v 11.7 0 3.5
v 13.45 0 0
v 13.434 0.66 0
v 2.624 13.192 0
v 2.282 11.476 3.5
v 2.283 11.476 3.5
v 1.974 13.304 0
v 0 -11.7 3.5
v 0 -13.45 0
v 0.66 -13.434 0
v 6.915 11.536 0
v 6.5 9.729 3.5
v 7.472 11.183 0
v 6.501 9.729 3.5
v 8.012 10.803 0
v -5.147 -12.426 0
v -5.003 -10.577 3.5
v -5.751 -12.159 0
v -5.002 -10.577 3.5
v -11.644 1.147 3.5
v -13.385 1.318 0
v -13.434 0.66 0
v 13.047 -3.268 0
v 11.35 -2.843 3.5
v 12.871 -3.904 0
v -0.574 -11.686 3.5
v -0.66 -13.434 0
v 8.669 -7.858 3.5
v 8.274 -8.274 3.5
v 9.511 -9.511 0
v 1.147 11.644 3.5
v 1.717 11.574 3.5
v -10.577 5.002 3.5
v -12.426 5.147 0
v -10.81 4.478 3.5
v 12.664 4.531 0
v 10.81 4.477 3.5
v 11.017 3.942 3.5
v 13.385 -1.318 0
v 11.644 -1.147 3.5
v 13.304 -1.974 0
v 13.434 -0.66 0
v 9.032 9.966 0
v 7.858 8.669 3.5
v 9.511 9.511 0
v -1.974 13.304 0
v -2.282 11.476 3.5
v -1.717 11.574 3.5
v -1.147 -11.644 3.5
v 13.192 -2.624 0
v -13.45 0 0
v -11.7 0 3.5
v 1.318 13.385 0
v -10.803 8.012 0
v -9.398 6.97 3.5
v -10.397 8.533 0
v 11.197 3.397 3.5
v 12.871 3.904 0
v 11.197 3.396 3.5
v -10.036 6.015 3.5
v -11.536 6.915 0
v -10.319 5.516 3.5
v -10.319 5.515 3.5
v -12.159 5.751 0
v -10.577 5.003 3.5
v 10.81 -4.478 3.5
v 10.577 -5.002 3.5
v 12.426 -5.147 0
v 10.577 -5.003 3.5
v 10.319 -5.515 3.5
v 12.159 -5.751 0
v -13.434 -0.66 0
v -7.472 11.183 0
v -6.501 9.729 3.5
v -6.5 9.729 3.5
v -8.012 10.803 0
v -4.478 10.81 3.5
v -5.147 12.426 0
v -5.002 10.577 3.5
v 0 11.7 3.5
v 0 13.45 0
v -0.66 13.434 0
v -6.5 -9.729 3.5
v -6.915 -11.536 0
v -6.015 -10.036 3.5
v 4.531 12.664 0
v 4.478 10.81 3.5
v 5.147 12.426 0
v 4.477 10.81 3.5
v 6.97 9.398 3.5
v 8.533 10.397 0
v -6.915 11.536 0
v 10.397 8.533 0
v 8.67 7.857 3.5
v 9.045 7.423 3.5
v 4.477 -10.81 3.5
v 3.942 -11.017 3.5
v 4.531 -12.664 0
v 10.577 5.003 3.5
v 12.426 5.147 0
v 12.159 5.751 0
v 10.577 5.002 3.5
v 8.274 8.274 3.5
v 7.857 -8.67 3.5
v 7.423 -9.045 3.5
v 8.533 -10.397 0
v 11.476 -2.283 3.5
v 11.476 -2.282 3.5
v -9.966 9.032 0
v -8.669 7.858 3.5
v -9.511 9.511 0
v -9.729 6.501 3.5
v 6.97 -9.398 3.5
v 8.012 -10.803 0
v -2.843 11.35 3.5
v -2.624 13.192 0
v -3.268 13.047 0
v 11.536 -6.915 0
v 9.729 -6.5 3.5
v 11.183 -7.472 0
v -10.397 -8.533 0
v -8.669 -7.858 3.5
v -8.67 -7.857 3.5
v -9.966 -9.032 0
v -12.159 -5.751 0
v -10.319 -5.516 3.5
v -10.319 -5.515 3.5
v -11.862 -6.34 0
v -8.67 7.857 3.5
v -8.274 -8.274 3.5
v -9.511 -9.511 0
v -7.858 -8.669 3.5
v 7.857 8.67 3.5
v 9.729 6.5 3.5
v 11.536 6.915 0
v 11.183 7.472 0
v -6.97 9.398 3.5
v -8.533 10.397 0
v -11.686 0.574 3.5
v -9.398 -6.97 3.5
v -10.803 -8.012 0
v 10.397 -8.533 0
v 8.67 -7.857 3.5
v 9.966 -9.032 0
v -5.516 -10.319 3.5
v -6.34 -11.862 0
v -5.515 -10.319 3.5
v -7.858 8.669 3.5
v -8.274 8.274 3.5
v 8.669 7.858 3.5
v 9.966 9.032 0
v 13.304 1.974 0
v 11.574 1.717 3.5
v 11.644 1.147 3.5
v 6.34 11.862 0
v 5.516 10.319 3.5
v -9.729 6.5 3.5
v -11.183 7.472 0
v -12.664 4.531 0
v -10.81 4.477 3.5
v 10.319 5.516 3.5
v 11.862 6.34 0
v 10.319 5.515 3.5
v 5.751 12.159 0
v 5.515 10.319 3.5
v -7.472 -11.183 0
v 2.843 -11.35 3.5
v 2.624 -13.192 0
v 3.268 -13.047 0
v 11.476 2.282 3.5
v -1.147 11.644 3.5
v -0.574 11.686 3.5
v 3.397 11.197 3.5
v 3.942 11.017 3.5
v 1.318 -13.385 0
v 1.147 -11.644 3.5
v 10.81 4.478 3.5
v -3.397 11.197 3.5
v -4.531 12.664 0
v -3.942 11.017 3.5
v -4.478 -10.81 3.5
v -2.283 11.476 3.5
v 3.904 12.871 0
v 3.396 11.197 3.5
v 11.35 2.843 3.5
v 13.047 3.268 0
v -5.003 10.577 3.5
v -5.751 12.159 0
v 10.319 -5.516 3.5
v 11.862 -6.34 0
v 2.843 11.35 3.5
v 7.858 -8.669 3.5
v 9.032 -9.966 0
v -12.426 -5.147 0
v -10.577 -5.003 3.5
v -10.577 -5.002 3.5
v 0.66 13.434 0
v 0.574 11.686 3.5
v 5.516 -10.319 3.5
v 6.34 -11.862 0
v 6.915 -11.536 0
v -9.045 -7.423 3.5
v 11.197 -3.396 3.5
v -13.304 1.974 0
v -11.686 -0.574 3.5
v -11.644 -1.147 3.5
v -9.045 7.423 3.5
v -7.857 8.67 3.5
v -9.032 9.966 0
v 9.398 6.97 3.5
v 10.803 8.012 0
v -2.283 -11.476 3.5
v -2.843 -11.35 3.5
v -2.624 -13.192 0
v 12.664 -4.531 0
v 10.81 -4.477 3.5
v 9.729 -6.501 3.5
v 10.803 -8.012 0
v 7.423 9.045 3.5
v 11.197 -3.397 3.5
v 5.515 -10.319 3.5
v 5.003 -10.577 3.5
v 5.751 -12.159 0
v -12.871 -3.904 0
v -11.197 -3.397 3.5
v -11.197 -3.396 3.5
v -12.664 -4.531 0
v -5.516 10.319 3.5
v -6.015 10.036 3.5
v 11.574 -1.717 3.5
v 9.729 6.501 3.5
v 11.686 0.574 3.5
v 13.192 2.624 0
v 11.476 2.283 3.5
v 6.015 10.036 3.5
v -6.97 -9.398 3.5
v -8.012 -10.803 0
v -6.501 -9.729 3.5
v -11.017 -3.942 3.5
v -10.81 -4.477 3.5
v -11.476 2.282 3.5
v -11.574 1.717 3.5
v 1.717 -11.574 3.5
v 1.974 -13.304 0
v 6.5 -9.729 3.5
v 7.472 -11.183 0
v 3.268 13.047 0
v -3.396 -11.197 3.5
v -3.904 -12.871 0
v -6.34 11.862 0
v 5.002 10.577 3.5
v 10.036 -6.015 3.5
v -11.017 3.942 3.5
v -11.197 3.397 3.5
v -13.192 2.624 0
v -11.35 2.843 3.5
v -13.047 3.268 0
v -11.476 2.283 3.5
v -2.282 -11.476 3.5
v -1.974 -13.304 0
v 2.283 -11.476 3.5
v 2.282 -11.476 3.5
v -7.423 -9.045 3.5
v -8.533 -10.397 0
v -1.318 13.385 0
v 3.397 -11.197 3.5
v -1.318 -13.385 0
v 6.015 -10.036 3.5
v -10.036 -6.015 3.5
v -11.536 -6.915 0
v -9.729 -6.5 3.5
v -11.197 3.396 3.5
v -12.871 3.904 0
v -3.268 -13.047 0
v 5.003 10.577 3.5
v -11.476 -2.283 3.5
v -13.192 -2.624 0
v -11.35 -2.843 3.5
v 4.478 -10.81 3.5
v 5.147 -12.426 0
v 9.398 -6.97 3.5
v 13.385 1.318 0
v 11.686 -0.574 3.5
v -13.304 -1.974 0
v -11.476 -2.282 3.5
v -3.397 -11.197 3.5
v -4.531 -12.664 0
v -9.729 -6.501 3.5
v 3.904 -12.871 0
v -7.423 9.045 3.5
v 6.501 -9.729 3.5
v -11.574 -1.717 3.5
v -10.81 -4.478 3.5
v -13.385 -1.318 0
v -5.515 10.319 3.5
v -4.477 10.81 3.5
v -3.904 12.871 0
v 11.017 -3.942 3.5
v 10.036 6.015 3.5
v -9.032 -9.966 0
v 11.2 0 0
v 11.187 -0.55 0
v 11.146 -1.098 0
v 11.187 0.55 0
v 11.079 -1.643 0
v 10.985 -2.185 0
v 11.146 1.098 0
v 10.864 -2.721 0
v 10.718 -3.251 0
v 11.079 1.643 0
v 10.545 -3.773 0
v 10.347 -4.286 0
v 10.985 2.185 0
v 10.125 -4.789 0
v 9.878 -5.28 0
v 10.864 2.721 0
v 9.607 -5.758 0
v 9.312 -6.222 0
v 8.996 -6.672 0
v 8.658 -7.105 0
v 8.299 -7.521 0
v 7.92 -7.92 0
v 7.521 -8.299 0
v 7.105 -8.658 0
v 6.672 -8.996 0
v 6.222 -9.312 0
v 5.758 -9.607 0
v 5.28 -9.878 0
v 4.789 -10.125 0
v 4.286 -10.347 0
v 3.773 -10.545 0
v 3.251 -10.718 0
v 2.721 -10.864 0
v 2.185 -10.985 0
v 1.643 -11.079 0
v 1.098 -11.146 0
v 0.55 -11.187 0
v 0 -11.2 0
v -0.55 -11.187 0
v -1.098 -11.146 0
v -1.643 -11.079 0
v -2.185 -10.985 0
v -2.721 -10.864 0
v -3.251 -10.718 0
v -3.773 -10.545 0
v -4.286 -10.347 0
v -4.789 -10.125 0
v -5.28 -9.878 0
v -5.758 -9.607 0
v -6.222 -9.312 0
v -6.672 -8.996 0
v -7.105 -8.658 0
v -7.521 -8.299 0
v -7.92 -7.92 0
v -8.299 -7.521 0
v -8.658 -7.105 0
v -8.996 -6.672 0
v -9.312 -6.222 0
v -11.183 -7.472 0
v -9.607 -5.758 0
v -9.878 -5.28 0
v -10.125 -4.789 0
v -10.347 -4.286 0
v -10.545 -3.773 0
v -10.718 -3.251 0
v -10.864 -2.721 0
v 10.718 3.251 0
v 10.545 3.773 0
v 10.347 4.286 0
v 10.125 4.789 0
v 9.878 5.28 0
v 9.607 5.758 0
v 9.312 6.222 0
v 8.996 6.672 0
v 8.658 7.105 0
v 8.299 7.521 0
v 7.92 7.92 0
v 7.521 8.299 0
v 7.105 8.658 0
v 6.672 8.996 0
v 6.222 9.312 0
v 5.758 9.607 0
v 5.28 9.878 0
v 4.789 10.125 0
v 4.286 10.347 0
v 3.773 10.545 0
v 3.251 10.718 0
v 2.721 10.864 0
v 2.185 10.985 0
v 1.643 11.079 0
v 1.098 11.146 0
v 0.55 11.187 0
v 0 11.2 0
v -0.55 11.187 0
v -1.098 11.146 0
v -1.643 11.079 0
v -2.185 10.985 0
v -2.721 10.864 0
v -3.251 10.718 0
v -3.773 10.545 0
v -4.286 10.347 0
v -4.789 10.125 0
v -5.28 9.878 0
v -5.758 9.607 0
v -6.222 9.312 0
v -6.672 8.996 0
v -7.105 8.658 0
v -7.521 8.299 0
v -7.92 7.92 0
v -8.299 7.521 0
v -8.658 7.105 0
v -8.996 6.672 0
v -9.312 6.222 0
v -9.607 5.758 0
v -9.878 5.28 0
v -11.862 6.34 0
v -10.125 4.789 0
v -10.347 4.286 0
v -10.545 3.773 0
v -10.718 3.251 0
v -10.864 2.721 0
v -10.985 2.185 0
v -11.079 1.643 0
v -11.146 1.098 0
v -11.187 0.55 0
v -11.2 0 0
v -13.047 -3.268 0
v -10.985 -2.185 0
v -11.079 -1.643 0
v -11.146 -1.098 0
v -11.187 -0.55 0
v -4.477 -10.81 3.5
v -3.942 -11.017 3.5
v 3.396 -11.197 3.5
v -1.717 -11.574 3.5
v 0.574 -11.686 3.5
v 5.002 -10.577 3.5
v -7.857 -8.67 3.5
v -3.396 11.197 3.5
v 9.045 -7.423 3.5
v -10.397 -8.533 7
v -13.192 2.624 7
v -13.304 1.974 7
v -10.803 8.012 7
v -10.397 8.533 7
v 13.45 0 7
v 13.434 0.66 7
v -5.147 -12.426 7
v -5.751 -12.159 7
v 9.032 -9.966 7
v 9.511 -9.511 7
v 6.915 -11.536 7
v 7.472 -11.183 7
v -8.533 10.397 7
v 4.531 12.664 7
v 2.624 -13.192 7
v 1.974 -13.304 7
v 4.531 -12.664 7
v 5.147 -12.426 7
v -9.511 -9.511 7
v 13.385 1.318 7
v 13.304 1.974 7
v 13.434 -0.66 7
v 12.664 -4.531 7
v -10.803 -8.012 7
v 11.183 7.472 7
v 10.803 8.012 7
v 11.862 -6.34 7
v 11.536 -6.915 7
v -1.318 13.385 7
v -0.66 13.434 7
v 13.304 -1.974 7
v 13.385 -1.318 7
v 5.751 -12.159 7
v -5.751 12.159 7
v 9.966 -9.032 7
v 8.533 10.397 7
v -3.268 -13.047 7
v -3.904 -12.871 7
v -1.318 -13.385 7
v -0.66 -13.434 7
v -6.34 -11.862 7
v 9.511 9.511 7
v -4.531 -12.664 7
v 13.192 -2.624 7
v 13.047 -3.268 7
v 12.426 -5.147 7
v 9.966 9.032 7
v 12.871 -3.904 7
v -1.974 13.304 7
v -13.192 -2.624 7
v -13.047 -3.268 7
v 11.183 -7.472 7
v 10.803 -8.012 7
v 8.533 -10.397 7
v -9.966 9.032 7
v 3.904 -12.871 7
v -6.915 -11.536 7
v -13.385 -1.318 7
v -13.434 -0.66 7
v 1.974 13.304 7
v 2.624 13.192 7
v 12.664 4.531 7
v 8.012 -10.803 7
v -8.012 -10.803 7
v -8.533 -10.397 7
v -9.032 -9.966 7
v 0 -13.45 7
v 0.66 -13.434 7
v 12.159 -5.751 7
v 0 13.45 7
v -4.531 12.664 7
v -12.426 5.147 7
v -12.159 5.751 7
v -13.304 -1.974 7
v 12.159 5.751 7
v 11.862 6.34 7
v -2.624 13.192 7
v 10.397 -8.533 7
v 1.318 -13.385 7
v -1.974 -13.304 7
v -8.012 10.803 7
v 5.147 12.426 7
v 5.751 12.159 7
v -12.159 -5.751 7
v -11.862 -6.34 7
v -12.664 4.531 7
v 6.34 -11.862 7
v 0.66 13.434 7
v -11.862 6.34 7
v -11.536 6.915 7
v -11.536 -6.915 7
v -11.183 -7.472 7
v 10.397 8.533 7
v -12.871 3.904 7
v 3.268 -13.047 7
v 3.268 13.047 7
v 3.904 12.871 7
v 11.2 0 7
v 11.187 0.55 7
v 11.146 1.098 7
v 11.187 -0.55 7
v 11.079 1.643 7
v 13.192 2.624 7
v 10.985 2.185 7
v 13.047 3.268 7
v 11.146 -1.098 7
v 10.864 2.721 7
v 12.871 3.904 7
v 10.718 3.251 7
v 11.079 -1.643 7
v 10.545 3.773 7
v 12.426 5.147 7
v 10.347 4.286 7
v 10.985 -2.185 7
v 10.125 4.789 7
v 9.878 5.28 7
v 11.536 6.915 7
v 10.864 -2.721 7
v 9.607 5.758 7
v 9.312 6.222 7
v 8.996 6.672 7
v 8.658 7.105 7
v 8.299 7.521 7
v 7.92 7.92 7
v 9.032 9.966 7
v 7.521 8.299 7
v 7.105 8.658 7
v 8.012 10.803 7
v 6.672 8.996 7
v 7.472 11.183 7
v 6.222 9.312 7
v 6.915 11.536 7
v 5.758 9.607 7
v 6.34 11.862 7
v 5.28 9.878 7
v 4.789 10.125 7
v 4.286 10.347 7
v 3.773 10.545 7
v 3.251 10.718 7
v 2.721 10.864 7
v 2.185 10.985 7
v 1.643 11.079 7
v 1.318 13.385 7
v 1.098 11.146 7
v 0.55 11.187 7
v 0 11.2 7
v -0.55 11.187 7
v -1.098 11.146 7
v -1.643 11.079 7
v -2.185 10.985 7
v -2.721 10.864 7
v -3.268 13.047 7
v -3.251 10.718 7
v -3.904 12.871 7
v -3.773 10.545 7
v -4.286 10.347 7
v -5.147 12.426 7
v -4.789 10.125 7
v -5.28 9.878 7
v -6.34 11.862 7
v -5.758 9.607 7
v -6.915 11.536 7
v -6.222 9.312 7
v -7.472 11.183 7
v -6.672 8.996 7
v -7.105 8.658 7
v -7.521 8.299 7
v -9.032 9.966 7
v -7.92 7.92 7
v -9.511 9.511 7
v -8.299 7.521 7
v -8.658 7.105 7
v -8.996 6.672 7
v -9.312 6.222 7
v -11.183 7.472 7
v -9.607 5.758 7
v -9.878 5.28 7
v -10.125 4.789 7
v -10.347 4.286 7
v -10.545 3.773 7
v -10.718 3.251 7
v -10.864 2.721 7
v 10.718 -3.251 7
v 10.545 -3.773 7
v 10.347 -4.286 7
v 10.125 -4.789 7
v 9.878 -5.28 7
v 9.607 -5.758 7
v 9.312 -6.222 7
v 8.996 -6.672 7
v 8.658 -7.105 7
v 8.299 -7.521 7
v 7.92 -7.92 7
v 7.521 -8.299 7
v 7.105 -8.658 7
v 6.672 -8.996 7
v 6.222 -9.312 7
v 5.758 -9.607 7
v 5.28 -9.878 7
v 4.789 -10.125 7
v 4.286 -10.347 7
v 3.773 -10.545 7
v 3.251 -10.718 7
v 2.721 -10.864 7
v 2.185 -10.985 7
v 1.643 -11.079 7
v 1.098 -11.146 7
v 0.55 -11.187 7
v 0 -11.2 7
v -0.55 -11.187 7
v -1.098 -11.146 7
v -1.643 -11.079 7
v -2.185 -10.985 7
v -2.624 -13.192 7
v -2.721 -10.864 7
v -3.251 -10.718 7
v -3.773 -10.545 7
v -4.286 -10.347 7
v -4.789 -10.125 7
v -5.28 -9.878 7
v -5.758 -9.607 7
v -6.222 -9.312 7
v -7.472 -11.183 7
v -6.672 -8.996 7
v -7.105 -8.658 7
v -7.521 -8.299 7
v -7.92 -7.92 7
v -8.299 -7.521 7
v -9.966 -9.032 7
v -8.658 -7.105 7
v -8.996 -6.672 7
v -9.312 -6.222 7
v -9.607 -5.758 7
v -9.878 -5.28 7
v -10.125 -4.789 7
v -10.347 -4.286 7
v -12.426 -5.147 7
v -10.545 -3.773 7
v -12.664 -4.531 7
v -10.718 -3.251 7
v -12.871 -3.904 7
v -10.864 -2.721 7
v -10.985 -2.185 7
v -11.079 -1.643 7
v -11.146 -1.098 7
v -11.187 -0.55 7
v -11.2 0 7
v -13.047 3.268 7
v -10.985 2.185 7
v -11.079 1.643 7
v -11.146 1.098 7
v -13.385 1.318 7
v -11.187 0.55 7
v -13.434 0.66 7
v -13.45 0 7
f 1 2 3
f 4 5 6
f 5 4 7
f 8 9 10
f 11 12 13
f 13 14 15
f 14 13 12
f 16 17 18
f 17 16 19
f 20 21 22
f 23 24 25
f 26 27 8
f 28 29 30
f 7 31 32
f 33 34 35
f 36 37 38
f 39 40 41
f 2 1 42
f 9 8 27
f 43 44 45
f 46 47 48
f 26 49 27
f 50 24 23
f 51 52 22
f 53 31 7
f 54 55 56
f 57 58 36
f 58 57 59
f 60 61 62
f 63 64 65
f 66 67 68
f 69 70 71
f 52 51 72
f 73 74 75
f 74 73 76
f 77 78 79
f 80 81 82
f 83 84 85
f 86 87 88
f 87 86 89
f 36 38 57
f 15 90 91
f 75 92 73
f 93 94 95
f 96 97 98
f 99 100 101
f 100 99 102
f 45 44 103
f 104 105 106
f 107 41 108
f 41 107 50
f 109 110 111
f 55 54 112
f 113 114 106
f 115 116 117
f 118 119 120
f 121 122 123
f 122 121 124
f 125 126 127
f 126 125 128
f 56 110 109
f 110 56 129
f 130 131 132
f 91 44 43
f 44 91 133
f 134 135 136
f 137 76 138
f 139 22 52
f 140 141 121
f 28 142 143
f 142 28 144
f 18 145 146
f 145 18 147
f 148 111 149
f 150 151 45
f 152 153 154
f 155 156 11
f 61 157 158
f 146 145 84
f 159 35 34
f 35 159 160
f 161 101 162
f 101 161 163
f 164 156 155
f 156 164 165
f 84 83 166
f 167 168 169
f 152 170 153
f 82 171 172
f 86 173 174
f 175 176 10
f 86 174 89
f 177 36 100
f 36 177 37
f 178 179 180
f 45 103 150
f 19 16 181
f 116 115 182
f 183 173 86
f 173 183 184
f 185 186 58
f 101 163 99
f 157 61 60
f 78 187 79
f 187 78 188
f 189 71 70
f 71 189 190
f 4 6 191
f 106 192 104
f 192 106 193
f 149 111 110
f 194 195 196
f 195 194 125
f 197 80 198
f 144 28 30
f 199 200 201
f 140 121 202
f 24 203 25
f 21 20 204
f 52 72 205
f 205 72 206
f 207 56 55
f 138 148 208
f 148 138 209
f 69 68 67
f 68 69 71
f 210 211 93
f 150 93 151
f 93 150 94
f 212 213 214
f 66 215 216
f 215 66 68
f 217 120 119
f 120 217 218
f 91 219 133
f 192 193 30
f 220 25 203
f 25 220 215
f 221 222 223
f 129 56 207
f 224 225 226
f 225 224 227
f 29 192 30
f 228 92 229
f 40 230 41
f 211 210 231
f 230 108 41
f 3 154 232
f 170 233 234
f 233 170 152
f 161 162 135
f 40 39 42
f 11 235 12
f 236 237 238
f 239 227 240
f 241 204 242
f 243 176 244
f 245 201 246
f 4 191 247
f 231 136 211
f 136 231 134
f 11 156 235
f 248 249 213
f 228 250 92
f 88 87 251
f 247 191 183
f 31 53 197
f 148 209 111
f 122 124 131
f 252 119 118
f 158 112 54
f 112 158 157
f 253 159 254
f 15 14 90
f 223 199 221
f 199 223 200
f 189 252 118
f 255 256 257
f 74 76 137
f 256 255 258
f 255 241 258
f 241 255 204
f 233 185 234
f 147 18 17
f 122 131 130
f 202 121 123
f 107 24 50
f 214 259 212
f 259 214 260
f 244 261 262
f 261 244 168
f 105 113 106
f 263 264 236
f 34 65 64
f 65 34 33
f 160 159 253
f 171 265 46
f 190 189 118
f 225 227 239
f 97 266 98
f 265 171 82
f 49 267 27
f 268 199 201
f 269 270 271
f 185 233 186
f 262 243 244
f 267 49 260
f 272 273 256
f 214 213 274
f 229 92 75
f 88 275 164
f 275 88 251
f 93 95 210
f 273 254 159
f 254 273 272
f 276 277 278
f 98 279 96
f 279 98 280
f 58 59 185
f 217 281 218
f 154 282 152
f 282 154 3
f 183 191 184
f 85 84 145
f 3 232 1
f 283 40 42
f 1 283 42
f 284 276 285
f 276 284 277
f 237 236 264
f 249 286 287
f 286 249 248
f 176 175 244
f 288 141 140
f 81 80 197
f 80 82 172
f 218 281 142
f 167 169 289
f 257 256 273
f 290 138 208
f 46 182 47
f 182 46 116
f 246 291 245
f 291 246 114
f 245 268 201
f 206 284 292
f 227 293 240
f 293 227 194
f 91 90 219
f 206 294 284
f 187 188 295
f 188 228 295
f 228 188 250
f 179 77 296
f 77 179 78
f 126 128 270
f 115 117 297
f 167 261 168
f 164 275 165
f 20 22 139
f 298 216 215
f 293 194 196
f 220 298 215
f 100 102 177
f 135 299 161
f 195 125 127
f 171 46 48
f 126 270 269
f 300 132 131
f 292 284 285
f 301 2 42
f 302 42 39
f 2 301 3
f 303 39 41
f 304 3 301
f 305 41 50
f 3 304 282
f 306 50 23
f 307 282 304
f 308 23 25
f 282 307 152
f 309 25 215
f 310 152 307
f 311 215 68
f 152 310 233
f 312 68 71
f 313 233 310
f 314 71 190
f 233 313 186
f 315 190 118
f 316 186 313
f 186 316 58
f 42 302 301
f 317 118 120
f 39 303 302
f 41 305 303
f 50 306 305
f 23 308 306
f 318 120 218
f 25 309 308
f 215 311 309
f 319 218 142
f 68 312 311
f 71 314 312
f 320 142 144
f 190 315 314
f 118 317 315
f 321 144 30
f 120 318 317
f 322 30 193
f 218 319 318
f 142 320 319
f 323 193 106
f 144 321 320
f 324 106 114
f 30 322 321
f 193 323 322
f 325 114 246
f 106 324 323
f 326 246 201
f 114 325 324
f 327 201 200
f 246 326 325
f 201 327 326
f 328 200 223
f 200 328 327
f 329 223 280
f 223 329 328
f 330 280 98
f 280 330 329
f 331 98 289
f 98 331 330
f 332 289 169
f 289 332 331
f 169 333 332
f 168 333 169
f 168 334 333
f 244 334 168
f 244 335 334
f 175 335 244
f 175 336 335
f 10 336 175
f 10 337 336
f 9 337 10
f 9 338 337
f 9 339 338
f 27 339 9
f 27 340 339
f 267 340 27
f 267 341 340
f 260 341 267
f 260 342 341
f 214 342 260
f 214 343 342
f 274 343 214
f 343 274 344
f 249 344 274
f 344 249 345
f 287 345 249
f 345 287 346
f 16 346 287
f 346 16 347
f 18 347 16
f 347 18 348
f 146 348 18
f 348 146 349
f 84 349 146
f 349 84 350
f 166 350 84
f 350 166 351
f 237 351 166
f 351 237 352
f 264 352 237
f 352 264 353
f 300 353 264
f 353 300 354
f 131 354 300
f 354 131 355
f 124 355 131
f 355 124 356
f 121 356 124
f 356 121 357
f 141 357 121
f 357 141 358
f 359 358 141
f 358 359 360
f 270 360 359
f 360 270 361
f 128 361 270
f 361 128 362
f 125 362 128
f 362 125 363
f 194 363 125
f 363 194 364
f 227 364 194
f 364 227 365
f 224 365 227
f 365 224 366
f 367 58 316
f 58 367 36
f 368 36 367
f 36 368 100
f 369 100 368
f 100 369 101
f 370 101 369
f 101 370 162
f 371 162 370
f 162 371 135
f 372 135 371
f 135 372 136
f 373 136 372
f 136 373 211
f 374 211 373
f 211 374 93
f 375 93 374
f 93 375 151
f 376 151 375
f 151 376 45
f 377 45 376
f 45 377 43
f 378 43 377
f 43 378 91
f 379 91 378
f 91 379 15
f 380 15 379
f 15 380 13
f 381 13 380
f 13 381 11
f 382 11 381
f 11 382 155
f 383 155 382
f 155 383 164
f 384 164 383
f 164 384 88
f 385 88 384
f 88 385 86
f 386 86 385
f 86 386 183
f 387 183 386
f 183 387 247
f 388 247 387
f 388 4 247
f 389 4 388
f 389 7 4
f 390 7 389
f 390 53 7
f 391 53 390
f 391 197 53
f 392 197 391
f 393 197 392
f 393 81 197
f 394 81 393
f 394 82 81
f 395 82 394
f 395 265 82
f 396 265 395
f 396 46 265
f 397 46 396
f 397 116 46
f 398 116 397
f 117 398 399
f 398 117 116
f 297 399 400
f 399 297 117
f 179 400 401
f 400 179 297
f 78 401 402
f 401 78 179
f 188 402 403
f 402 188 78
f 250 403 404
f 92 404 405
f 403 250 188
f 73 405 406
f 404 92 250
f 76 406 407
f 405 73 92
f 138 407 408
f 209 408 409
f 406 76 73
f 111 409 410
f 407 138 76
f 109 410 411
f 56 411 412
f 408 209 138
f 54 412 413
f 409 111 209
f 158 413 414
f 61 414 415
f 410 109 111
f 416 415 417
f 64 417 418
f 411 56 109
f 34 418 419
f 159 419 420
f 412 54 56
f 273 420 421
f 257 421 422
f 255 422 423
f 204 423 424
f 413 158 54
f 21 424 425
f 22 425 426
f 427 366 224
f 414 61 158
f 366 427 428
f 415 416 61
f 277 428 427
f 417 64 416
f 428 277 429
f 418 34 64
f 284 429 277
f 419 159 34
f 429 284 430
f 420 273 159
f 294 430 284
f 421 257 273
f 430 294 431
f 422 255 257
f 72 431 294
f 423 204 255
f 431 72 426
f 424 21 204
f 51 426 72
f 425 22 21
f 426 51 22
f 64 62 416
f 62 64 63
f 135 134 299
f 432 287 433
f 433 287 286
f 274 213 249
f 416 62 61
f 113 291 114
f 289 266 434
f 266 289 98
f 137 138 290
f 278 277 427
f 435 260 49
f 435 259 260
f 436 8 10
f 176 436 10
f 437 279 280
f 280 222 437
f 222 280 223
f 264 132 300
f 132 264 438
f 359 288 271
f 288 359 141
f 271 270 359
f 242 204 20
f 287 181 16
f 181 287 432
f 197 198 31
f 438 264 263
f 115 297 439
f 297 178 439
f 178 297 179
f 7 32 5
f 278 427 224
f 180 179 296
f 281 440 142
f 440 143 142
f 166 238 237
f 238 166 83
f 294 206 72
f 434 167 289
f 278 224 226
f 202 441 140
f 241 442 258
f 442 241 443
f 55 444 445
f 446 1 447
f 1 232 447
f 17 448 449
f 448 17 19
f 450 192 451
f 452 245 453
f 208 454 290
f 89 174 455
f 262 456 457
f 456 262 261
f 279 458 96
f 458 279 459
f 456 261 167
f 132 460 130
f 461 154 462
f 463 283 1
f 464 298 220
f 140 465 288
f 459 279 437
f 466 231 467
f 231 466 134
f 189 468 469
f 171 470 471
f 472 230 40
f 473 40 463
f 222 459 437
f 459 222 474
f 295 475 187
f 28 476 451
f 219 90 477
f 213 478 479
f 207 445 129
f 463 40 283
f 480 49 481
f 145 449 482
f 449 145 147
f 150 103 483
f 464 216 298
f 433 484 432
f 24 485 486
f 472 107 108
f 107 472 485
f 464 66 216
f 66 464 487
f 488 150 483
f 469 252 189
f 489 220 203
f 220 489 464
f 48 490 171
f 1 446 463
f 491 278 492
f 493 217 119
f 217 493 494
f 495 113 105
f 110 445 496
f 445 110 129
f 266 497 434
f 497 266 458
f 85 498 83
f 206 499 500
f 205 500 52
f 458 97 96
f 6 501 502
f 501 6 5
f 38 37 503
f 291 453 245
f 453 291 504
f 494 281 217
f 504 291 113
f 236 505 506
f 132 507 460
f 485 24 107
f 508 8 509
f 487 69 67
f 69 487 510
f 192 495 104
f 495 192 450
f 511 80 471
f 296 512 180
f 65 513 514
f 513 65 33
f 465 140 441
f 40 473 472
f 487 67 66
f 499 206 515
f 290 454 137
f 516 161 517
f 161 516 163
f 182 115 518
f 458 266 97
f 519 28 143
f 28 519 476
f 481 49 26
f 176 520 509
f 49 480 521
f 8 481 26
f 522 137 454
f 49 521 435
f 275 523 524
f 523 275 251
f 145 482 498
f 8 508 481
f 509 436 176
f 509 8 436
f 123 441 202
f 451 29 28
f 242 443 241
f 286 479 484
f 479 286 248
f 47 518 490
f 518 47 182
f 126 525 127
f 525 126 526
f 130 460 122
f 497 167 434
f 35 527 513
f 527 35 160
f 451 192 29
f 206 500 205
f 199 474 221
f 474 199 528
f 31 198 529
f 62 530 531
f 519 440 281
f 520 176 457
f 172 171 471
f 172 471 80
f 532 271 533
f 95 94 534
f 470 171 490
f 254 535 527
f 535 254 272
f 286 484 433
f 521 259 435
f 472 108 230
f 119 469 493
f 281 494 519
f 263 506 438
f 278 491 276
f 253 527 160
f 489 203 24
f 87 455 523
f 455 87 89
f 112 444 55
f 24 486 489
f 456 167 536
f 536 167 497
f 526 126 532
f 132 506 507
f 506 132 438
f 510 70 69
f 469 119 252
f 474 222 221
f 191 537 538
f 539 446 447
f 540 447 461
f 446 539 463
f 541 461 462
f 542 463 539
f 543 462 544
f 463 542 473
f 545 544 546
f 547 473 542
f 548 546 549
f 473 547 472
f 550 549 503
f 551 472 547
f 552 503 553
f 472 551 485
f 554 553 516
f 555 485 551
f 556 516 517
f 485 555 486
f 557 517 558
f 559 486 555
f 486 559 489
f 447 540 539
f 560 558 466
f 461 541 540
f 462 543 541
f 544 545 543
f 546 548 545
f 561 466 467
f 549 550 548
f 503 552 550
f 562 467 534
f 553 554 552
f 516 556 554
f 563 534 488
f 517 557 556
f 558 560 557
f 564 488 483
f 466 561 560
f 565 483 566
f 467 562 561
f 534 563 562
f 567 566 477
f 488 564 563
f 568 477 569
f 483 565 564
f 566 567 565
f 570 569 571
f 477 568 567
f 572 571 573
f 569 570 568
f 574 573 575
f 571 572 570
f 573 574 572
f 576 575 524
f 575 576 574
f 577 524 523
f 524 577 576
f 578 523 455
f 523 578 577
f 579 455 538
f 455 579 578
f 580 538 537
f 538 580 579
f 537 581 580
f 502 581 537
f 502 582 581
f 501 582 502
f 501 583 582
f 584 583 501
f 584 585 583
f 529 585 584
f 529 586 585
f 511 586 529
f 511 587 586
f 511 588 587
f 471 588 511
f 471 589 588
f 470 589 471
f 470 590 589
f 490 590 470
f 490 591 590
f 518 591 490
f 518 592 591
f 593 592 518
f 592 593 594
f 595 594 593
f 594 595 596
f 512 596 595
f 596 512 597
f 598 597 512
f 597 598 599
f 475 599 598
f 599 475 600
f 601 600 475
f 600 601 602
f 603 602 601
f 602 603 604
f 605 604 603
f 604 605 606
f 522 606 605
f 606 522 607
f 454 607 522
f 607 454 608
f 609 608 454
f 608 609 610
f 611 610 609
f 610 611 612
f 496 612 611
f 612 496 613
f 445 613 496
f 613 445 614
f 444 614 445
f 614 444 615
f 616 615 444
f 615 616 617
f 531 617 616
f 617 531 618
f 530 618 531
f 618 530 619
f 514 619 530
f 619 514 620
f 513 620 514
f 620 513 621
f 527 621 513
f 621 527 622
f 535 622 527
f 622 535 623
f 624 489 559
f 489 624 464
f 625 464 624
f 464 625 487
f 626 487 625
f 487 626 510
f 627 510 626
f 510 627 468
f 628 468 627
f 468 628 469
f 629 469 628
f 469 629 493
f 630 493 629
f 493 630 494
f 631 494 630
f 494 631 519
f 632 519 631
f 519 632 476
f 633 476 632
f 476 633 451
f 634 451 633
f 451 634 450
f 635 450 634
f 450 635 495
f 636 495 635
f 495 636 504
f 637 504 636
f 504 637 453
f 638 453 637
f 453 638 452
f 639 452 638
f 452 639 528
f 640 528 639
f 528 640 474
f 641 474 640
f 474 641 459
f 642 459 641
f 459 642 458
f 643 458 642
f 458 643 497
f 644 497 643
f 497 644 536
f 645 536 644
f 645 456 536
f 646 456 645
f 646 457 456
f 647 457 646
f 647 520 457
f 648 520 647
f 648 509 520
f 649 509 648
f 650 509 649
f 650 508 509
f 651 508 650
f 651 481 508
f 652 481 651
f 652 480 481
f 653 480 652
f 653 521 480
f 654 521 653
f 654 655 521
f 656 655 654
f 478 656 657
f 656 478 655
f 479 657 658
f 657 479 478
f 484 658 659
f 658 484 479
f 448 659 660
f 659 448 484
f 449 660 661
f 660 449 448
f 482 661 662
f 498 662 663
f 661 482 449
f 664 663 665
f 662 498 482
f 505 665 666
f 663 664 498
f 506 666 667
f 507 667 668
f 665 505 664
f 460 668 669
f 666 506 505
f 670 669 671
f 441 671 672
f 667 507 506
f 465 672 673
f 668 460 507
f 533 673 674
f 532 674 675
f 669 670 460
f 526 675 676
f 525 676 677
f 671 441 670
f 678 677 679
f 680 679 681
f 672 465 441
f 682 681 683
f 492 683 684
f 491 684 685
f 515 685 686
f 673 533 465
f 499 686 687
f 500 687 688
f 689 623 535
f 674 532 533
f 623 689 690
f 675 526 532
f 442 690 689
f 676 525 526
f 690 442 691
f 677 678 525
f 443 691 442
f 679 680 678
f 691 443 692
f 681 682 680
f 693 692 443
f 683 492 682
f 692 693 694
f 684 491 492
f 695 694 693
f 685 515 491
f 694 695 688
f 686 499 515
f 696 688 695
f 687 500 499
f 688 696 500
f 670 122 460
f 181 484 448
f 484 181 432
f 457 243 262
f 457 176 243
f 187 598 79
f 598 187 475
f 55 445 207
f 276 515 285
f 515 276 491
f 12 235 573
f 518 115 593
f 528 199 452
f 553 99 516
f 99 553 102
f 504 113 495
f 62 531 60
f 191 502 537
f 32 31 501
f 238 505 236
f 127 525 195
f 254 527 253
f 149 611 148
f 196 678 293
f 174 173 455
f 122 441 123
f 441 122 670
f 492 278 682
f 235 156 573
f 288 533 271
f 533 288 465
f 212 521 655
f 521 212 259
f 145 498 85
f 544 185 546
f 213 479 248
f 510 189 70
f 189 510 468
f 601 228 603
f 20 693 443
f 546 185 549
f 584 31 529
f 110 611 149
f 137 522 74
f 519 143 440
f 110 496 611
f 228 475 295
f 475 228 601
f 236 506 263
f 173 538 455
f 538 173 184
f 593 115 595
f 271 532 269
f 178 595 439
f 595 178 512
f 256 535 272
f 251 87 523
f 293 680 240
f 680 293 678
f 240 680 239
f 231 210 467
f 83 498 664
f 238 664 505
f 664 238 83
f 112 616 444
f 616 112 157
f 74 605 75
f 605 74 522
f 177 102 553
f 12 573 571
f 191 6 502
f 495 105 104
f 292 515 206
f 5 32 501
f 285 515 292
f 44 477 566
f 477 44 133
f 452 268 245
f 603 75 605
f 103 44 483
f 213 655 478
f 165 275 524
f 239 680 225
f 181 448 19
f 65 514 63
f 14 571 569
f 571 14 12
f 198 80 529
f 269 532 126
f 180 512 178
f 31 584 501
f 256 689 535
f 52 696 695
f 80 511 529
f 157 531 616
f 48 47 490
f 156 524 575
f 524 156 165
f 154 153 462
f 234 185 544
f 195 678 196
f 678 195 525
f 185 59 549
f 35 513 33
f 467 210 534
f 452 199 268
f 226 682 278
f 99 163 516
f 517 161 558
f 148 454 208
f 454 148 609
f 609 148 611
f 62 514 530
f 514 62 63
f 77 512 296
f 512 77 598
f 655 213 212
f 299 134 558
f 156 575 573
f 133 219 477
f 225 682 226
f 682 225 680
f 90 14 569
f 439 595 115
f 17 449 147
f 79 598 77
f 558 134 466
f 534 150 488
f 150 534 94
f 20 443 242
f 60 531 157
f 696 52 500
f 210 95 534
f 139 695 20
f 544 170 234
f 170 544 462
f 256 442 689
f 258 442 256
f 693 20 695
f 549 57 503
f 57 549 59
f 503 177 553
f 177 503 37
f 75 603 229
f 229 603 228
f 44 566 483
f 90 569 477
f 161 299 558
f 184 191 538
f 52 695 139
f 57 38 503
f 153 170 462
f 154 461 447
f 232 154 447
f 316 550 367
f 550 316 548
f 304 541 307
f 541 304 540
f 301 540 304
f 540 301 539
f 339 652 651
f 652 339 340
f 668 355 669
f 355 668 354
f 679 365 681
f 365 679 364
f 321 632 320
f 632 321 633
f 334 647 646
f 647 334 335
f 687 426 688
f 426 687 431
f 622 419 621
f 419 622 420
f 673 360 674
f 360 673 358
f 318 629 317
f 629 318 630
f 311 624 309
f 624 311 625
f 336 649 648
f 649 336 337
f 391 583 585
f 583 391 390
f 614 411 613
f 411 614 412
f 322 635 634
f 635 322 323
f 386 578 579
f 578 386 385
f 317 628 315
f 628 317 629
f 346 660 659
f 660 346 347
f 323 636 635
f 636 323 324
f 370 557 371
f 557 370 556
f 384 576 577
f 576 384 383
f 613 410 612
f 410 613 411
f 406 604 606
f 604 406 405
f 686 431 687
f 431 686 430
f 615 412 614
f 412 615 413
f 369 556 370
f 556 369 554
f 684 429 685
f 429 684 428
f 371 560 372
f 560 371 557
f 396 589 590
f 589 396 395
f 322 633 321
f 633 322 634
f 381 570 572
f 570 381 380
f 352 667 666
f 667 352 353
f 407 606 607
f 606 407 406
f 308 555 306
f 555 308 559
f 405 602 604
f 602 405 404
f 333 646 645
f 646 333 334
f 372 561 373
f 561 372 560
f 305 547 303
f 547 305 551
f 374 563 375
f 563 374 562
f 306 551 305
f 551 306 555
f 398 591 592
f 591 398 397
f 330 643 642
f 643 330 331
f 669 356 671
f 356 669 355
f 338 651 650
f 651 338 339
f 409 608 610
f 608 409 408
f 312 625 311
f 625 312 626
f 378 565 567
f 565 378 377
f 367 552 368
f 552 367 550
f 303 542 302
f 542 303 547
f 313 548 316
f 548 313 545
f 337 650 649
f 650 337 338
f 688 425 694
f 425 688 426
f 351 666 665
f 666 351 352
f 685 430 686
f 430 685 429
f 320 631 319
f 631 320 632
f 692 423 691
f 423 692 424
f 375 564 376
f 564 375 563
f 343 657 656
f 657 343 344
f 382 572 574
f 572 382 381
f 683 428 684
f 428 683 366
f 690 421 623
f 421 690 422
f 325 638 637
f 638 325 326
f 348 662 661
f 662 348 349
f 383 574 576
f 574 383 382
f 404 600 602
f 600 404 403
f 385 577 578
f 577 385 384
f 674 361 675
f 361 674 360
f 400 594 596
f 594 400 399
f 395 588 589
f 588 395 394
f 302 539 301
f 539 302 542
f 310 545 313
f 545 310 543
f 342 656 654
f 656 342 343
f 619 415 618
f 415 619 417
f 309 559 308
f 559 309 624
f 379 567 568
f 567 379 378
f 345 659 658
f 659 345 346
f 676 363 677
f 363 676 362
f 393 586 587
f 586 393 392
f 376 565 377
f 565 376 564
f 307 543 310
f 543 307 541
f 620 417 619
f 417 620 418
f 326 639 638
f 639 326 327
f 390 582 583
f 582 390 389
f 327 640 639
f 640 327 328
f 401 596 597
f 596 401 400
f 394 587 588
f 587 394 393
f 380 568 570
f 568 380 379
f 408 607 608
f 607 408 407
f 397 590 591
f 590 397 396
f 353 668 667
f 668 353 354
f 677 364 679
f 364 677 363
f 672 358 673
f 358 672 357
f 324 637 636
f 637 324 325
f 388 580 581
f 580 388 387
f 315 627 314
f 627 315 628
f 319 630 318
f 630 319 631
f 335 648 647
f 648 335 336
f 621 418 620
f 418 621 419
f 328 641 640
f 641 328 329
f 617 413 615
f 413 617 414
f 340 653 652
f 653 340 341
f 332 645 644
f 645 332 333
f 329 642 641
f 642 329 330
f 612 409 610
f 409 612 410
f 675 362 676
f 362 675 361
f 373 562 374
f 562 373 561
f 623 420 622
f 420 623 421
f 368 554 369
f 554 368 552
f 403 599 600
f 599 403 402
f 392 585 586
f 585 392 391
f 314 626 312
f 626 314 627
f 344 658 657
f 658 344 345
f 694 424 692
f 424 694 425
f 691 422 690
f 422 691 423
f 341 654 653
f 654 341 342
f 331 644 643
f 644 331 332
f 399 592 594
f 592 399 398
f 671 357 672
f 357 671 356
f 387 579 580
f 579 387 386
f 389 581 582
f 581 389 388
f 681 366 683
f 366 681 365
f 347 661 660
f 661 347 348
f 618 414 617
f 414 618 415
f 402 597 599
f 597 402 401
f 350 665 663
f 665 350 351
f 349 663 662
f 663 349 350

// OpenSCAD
// file: configuration.scad
/*
 * Igor Soares' parallel kinematic XY
 * Configuration
 * (C) 2014 by Ígor Bruno Pereira Soares
 *
 * This project is free: you can redistribute it and/or modify
 * it under the terms of the GNU General Public License as published by
 * the Free Software Foundation, either version 2 of the License, or
 * (at your option) any later version.
 *
 * This project is distributed in the hope that it will be useful,
 * but WITHOUT ANY WARRANTY; without even the implied warranty of
 * MERCHANTABILITY or FITNESS FOR A PARTICULAR PURPOSE.  See the
 * GNU General Public License for more details.
 *
 * You should have received a copy of the GNU General Public License
 * along with this project.  If not, see <http://www.gnu.org/licenses/>.
 */

LIGHT_WALL_WIDTH = 2.01;
WALL_WIDTH = 5.0;
VERTICAL_SUPPORT_WALL = 0.5;
HORIZONTAL_SUPPORT_WALL = 0.255;

BEARING_DIAMETER = 22.4;
BEARING_WIDTH = 7;
BEARING_SCREW_DIAMETER = 8.2;
BEARING_SCREW_NUT_WIDTH = 13;

INNER_BEARING_SCREW_DISTANCE_TO_ROD = VERTICAL_SUPPORT_WALL;
INNER_BEARING_POS = 15;

SPACING_TO_BEARING = 18.0;
ROD_ACTUAL_DIAMETER = 8.0;
ROD_HOLE_DIAMETER = 8.4;

ROD_CLAMP_SCREW_DIAMETER = 3.6;
ROD_CLAMP_SCREW_NUT_WIDTH = 6.7;
ROD_CLAMP_SCREW_NUT_H = 3.5;
ROD_CLAMP_GAP = 1.0;

MOTOR_SCREW_DIAMETER = 3.4;
MOTOR_SCREW_MOUNT = 31; // nema 17
MOTOR_SIZE = 43;
MOTOR_MOUNT_INNER_DIAMETER = 30;
MOTOR_BELT_CLEARANCE = 5;

MOTOR_SUPPORT_SCREW_DIAMETER = 4.8 + 0.3; // 3/16 + tolerance
MOTOR_SUPPORT_SCREWS_DISTANCE = 40;

BEARING_GUIDE_H = 7;
BEARING_GUIDE_ANGLE = 30;

ST = 0.001;
// main file
/*
 * Igor Soares' parallel kinematic XY
 * Bearing Guide
 * (C) 2014 by Ígor Bruno Pereira Soares
 *
 * This project is free: you can redistribute it and/or modify
 * it under the terms of the GNU General Public License as published by
 * the Free Software Foundation, either version 2 of the License, or
 * (at your option) any later version.
 *
 * This project is distributed in the hope that it will be useful,
 * but WITHOUT ANY WARRANTY; without even the implied warranty of
 * MERCHANTABILITY or FITNESS FOR A PARTICULAR PURPOSE.  See the
 * GNU General Public License for more details.
 *
 * You should have received a copy of the GNU General Public License
 * along with this project.  If not, see <http://www.gnu.org/licenses/>.
 */

include <configuration.scad>

bearing_guide($fn=128);
module bearing_guide(
  min_wall=VERTICAL_SUPPORT_WALL,
  bearing_r=BEARING_DIAMETER/2,
  bearing_guide_h=BEARING_GUIDE_H,
  guide_angle=BEARING_GUIDE_ANGLE)
{
  rminor=bearing_r + min_wall;
  rmajor=rminor + (bearing_guide_h/2)*sin(guide_angle);

  difference() {
    union() {
      cylinder(r1=rmajor, r2=rminor, h=bearing_guide_h/2 + ST);
      translate([0,0, bearing_guide_h/2 - ST])
        cylinder(r2=rmajor, r1=rminor, h=bearing_guide_h/2 + ST);
    }
    translate([0,0,-1])
      #cylinder(r=bearing_r, h=bearing_guide_h + 2);
  }
}
